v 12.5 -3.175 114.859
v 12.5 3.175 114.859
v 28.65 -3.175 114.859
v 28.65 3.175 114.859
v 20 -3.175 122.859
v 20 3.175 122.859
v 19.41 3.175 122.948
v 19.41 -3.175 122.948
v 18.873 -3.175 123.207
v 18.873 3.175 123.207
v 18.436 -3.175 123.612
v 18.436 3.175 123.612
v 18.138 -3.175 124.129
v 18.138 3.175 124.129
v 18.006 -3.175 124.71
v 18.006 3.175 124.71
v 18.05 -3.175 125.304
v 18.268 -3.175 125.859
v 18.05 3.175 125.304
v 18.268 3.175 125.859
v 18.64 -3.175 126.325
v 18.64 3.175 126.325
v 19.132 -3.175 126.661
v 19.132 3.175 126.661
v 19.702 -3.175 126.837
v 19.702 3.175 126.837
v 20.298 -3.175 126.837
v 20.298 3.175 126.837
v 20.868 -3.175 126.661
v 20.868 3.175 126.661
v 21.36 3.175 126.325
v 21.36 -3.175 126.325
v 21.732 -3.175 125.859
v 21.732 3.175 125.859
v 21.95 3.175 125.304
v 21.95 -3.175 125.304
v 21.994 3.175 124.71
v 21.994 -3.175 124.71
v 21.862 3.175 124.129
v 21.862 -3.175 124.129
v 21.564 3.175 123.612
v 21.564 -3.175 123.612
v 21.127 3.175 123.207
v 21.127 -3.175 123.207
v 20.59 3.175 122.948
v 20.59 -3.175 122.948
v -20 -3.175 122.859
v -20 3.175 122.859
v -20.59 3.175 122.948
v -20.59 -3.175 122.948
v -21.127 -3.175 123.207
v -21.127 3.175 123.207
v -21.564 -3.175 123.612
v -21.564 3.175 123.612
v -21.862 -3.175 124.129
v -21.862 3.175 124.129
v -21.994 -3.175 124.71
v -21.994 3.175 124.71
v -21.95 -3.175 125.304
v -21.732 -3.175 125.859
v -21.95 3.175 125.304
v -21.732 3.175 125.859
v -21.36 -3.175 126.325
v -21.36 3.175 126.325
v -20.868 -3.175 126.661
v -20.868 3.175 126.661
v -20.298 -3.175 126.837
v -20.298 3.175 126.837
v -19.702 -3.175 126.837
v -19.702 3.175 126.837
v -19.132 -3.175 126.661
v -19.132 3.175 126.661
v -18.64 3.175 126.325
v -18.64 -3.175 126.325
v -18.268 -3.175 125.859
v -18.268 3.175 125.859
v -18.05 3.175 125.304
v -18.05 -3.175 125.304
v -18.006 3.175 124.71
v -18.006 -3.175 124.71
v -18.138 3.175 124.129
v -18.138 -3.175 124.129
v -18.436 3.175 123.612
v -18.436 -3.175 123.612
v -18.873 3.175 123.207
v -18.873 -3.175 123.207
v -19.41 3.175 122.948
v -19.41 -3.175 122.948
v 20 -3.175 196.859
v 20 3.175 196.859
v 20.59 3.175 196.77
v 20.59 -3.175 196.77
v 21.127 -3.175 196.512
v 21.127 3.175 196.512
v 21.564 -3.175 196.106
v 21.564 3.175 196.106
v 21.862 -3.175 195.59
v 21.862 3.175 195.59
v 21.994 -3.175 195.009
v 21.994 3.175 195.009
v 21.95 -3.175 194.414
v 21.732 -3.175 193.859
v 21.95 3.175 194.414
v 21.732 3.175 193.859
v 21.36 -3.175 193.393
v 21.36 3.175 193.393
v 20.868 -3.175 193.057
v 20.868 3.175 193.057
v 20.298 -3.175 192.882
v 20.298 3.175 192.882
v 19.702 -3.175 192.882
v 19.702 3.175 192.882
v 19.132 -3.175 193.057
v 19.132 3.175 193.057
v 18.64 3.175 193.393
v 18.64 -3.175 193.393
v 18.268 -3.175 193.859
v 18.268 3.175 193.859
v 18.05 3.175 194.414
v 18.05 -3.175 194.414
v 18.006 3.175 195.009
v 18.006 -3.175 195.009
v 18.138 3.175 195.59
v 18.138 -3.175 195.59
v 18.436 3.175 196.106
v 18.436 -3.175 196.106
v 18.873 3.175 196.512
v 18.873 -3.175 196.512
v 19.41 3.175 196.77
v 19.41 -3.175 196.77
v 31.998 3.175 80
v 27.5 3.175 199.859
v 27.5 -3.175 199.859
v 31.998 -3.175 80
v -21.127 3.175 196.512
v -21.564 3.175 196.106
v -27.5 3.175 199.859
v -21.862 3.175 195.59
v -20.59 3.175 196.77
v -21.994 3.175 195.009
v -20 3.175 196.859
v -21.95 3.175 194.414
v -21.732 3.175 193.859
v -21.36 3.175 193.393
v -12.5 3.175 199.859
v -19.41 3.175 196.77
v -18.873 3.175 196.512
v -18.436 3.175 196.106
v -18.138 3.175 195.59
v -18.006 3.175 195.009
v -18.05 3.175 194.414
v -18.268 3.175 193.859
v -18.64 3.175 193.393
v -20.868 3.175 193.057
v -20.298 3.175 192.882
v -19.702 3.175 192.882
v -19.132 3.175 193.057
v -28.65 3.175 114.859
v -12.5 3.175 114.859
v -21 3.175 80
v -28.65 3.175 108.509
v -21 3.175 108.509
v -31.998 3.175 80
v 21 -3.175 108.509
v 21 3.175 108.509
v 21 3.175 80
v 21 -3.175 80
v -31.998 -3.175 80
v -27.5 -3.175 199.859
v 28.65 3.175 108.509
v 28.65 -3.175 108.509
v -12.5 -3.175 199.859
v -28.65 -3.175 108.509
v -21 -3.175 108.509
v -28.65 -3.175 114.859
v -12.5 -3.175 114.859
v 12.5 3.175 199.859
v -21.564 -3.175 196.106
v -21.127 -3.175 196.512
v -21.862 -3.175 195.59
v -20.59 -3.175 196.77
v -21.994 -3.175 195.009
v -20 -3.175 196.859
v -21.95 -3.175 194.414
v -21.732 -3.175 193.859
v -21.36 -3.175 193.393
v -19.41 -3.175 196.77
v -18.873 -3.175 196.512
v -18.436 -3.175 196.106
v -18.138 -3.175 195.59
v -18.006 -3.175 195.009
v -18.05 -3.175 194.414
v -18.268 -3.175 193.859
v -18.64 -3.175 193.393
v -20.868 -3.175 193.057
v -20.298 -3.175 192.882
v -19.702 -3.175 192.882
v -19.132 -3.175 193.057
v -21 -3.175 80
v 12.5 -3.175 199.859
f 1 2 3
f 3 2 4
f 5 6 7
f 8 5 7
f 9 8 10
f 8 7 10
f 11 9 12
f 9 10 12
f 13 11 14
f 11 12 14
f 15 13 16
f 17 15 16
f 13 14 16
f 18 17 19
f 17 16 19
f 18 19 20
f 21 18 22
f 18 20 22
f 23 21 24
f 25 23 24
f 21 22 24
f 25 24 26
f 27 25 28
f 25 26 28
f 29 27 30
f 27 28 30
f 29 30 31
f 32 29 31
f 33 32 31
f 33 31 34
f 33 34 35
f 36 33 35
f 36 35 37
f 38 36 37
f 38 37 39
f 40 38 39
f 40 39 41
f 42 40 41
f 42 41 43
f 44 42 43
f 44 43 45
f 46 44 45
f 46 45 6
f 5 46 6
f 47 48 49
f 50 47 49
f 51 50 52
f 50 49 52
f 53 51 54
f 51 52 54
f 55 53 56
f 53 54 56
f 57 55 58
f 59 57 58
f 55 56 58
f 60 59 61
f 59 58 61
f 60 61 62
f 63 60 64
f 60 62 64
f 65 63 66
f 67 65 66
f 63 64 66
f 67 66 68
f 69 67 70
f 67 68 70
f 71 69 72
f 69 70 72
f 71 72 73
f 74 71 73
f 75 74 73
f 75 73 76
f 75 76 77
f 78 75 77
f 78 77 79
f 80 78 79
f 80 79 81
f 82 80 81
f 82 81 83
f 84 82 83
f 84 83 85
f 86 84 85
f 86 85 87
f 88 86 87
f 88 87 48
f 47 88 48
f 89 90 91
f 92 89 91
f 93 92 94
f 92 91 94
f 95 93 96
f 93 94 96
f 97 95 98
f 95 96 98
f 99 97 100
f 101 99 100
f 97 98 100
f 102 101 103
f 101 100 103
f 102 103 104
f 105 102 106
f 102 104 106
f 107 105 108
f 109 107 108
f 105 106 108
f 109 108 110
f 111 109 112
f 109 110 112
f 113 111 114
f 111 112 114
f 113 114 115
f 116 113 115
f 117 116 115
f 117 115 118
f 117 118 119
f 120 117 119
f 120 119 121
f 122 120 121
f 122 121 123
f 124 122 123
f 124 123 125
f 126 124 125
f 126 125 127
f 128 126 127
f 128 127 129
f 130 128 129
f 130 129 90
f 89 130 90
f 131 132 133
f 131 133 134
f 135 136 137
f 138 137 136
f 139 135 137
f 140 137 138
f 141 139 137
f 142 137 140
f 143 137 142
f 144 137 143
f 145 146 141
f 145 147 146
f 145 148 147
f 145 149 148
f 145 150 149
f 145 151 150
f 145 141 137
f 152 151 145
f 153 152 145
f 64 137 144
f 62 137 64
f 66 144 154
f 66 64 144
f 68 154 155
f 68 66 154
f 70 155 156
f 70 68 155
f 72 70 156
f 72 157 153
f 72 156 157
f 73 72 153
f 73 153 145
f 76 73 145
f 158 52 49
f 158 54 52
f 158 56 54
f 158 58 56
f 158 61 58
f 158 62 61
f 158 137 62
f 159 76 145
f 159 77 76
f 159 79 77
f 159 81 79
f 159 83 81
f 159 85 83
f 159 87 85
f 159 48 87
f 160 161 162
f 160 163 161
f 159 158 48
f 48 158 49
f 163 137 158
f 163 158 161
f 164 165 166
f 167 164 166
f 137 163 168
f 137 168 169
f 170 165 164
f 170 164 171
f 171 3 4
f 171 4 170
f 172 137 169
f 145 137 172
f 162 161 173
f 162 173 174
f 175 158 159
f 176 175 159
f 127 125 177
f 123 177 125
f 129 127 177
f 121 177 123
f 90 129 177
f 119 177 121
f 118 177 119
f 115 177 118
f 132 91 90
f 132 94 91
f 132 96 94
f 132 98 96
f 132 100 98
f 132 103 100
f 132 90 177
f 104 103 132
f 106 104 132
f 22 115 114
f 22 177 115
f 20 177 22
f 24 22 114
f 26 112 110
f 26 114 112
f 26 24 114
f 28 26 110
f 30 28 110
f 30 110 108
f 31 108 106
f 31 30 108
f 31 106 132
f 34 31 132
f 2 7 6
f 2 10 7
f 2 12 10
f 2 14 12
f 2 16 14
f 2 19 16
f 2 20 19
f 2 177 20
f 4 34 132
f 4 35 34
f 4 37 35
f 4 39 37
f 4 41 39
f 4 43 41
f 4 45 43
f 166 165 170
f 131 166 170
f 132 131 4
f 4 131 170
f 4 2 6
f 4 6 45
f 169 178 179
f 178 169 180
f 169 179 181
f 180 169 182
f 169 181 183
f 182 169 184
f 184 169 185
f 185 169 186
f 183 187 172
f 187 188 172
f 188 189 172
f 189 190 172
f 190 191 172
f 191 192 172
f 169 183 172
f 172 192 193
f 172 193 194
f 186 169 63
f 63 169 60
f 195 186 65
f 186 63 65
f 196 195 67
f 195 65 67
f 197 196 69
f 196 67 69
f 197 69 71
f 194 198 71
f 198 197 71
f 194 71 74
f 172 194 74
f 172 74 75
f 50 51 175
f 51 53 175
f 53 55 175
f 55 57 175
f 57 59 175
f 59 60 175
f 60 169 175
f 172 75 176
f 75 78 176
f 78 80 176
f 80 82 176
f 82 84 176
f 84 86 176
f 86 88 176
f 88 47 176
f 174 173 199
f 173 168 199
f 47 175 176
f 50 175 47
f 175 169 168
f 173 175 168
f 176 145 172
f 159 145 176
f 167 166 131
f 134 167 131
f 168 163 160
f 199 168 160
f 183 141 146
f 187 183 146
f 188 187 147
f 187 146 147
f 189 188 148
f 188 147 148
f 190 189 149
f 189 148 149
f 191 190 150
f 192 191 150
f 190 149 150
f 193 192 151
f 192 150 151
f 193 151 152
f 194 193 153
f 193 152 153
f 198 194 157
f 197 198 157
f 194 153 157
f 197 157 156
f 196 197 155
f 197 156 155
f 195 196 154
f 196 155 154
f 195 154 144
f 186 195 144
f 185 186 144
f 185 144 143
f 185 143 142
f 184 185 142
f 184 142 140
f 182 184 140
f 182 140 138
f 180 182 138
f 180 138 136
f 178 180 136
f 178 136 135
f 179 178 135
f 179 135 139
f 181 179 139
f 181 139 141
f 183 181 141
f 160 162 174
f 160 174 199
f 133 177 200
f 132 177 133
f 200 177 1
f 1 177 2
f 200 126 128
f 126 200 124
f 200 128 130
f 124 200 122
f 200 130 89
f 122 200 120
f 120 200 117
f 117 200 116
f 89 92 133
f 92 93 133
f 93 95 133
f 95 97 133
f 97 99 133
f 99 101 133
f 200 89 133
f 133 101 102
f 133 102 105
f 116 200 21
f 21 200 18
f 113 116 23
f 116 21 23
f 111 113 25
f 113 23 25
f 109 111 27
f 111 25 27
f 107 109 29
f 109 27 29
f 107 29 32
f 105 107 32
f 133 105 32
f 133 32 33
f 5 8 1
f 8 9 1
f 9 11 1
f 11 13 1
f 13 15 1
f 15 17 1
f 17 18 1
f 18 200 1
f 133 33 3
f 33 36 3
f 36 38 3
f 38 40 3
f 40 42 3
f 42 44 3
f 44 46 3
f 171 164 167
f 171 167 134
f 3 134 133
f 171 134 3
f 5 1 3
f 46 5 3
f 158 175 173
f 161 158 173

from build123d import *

# Parameters (mm, degrees)
BOSS_EXTRUDE1_DEPTH = 3.175
CUT_EXTRUDE1_DEPTH  = 204.000178571
SKETCH3_W           = 42
SKETCH3_H           = 55.35
SKETCH3_W_2         = 25
SKETCH3_H_2         = 85
SKETCH3_W_3         = 7.65
SKETCH3_H_3         = 6.35
CUT_EXTRUDE2_DEPTH  = 203.504166283
SKETCH4_R           = 2
CUT_EXTRUDE3_DEPTH  = 203.504166283


with BuildPart() as part:
    # Sketch1 → Boss-Extrude1 (new, symmetric)
    with BuildSketch(Plane(origin=(0, 0, 0), x_dir=(1, 0, 0), z_dir=(0, 1, 0))):
        with BuildLine():
            ThreePointArc((35, 0), (0, 35), (-35, 0))
            Line((-35, 0), (-27.5, -199.859325527))
            Line((-27.5, -199.859325527), (27.5, -199.859325527))
            Line((27.5, -199.859325527), (35, 0))
        make_face()
    extrude(amount=BOSS_EXTRUDE1_DEPTH, both=True)

    # Sketch2 → Cut-Extrude1 (cut, through all)
    with BuildSketch(Plane(origin=(0, 3.175, 0), x_dir=(1, 0, 0), z_dir=(0, 1, 0))):
        with BuildLine():
            Line((-31.997888398, -80), (31.997888398, -80))
            Line((31.997888398, -80), (35, 0))
            ThreePointArc((35, 0), (0, 35), (-35, 0))
            Line((-35, 0), (-31.997888398, -80))
        make_face()
    extrude(amount=-CUT_EXTRUDE1_DEPTH, mode=Mode.SUBTRACT)

    # Sketch3 → Cut-Extrude2 (cut, through all)
    with BuildSketch(Plane(origin=(0, 3.175, 0), x_dir=(1, 0, 0), z_dir=(0, 1, 0))):
        with Locations((0, -87.184325527)):
            Rectangle(SKETCH3_W, SKETCH3_H)
        with Locations((0, -157.359325527)):
            Rectangle(SKETCH3_W_2, SKETCH3_H_2)
        with Locations((-24.825, -111.684325527)):
            Rectangle(SKETCH3_W_3, SKETCH3_H_3)
        with Locations((24.825, -111.684325527)):
            Rectangle(SKETCH3_W_3, SKETCH3_H_3)
    extrude(amount=-CUT_EXTRUDE2_DEPTH, mode=Mode.SUBTRACT)


with BuildPart() as cut_extrude2_piece_1:
    # of the separate pieces the step leaves, piece 1, a body of its own (cut_extrude2_pieces)
    add(part.part.solids().sort_by_distance((-31.997888398, 3.175, 80))[0])


with BuildPart() as cut_extrude2_piece_2:
    # of the separate pieces the step leaves, piece 2, a body of its own (cut_extrude2_pieces)
    add(part.part.solids().sort_by_distance((21, 3.175, 80))[0])


with BuildPart() as cut_extrude3_tool:
    # Sketch4 → Cut-Extrude3 (new, through all)
    with BuildSketch(Plane(origin=(0, 3.175, 0), x_dir=(1, 0, 0), z_dir=(0, 1, 0))):
        with Locations(Location((20, -194.859325527, 0), (0, 0, 270))):
            Circle(SKETCH4_R)
        with Locations(Location((-20, -194.859325527, 0), (0, 0, 270))):
            Circle(SKETCH4_R)
        with Locations(Location((-20, -124.859325527, 0), (0, 0, 90))):
            Circle(SKETCH4_R)
        with Locations(Location((20, -124.859325527, 0), (0, 0, 90))):
            Circle(SKETCH4_R)
    extrude(amount=-CUT_EXTRUDE3_DEPTH)


with BuildPart() as cut_extrude2_piece_1_1:
    add(cut_extrude2_piece_1.part)

    # Cut-Extrude3: cut by cut_extrude3_tool
    add(cut_extrude3_tool.part, mode=Mode.SUBTRACT)


with BuildPart() as cut_extrude2_piece_2_1:
    add(cut_extrude2_piece_2.part)

    # Cut-Extrude3: cut by cut_extrude3_tool
    add(cut_extrude3_tool.part, mode=Mode.SUBTRACT)


solid = Compound([cut_extrude2_piece_1_1.part, cut_extrude2_piece_2_1.part])
